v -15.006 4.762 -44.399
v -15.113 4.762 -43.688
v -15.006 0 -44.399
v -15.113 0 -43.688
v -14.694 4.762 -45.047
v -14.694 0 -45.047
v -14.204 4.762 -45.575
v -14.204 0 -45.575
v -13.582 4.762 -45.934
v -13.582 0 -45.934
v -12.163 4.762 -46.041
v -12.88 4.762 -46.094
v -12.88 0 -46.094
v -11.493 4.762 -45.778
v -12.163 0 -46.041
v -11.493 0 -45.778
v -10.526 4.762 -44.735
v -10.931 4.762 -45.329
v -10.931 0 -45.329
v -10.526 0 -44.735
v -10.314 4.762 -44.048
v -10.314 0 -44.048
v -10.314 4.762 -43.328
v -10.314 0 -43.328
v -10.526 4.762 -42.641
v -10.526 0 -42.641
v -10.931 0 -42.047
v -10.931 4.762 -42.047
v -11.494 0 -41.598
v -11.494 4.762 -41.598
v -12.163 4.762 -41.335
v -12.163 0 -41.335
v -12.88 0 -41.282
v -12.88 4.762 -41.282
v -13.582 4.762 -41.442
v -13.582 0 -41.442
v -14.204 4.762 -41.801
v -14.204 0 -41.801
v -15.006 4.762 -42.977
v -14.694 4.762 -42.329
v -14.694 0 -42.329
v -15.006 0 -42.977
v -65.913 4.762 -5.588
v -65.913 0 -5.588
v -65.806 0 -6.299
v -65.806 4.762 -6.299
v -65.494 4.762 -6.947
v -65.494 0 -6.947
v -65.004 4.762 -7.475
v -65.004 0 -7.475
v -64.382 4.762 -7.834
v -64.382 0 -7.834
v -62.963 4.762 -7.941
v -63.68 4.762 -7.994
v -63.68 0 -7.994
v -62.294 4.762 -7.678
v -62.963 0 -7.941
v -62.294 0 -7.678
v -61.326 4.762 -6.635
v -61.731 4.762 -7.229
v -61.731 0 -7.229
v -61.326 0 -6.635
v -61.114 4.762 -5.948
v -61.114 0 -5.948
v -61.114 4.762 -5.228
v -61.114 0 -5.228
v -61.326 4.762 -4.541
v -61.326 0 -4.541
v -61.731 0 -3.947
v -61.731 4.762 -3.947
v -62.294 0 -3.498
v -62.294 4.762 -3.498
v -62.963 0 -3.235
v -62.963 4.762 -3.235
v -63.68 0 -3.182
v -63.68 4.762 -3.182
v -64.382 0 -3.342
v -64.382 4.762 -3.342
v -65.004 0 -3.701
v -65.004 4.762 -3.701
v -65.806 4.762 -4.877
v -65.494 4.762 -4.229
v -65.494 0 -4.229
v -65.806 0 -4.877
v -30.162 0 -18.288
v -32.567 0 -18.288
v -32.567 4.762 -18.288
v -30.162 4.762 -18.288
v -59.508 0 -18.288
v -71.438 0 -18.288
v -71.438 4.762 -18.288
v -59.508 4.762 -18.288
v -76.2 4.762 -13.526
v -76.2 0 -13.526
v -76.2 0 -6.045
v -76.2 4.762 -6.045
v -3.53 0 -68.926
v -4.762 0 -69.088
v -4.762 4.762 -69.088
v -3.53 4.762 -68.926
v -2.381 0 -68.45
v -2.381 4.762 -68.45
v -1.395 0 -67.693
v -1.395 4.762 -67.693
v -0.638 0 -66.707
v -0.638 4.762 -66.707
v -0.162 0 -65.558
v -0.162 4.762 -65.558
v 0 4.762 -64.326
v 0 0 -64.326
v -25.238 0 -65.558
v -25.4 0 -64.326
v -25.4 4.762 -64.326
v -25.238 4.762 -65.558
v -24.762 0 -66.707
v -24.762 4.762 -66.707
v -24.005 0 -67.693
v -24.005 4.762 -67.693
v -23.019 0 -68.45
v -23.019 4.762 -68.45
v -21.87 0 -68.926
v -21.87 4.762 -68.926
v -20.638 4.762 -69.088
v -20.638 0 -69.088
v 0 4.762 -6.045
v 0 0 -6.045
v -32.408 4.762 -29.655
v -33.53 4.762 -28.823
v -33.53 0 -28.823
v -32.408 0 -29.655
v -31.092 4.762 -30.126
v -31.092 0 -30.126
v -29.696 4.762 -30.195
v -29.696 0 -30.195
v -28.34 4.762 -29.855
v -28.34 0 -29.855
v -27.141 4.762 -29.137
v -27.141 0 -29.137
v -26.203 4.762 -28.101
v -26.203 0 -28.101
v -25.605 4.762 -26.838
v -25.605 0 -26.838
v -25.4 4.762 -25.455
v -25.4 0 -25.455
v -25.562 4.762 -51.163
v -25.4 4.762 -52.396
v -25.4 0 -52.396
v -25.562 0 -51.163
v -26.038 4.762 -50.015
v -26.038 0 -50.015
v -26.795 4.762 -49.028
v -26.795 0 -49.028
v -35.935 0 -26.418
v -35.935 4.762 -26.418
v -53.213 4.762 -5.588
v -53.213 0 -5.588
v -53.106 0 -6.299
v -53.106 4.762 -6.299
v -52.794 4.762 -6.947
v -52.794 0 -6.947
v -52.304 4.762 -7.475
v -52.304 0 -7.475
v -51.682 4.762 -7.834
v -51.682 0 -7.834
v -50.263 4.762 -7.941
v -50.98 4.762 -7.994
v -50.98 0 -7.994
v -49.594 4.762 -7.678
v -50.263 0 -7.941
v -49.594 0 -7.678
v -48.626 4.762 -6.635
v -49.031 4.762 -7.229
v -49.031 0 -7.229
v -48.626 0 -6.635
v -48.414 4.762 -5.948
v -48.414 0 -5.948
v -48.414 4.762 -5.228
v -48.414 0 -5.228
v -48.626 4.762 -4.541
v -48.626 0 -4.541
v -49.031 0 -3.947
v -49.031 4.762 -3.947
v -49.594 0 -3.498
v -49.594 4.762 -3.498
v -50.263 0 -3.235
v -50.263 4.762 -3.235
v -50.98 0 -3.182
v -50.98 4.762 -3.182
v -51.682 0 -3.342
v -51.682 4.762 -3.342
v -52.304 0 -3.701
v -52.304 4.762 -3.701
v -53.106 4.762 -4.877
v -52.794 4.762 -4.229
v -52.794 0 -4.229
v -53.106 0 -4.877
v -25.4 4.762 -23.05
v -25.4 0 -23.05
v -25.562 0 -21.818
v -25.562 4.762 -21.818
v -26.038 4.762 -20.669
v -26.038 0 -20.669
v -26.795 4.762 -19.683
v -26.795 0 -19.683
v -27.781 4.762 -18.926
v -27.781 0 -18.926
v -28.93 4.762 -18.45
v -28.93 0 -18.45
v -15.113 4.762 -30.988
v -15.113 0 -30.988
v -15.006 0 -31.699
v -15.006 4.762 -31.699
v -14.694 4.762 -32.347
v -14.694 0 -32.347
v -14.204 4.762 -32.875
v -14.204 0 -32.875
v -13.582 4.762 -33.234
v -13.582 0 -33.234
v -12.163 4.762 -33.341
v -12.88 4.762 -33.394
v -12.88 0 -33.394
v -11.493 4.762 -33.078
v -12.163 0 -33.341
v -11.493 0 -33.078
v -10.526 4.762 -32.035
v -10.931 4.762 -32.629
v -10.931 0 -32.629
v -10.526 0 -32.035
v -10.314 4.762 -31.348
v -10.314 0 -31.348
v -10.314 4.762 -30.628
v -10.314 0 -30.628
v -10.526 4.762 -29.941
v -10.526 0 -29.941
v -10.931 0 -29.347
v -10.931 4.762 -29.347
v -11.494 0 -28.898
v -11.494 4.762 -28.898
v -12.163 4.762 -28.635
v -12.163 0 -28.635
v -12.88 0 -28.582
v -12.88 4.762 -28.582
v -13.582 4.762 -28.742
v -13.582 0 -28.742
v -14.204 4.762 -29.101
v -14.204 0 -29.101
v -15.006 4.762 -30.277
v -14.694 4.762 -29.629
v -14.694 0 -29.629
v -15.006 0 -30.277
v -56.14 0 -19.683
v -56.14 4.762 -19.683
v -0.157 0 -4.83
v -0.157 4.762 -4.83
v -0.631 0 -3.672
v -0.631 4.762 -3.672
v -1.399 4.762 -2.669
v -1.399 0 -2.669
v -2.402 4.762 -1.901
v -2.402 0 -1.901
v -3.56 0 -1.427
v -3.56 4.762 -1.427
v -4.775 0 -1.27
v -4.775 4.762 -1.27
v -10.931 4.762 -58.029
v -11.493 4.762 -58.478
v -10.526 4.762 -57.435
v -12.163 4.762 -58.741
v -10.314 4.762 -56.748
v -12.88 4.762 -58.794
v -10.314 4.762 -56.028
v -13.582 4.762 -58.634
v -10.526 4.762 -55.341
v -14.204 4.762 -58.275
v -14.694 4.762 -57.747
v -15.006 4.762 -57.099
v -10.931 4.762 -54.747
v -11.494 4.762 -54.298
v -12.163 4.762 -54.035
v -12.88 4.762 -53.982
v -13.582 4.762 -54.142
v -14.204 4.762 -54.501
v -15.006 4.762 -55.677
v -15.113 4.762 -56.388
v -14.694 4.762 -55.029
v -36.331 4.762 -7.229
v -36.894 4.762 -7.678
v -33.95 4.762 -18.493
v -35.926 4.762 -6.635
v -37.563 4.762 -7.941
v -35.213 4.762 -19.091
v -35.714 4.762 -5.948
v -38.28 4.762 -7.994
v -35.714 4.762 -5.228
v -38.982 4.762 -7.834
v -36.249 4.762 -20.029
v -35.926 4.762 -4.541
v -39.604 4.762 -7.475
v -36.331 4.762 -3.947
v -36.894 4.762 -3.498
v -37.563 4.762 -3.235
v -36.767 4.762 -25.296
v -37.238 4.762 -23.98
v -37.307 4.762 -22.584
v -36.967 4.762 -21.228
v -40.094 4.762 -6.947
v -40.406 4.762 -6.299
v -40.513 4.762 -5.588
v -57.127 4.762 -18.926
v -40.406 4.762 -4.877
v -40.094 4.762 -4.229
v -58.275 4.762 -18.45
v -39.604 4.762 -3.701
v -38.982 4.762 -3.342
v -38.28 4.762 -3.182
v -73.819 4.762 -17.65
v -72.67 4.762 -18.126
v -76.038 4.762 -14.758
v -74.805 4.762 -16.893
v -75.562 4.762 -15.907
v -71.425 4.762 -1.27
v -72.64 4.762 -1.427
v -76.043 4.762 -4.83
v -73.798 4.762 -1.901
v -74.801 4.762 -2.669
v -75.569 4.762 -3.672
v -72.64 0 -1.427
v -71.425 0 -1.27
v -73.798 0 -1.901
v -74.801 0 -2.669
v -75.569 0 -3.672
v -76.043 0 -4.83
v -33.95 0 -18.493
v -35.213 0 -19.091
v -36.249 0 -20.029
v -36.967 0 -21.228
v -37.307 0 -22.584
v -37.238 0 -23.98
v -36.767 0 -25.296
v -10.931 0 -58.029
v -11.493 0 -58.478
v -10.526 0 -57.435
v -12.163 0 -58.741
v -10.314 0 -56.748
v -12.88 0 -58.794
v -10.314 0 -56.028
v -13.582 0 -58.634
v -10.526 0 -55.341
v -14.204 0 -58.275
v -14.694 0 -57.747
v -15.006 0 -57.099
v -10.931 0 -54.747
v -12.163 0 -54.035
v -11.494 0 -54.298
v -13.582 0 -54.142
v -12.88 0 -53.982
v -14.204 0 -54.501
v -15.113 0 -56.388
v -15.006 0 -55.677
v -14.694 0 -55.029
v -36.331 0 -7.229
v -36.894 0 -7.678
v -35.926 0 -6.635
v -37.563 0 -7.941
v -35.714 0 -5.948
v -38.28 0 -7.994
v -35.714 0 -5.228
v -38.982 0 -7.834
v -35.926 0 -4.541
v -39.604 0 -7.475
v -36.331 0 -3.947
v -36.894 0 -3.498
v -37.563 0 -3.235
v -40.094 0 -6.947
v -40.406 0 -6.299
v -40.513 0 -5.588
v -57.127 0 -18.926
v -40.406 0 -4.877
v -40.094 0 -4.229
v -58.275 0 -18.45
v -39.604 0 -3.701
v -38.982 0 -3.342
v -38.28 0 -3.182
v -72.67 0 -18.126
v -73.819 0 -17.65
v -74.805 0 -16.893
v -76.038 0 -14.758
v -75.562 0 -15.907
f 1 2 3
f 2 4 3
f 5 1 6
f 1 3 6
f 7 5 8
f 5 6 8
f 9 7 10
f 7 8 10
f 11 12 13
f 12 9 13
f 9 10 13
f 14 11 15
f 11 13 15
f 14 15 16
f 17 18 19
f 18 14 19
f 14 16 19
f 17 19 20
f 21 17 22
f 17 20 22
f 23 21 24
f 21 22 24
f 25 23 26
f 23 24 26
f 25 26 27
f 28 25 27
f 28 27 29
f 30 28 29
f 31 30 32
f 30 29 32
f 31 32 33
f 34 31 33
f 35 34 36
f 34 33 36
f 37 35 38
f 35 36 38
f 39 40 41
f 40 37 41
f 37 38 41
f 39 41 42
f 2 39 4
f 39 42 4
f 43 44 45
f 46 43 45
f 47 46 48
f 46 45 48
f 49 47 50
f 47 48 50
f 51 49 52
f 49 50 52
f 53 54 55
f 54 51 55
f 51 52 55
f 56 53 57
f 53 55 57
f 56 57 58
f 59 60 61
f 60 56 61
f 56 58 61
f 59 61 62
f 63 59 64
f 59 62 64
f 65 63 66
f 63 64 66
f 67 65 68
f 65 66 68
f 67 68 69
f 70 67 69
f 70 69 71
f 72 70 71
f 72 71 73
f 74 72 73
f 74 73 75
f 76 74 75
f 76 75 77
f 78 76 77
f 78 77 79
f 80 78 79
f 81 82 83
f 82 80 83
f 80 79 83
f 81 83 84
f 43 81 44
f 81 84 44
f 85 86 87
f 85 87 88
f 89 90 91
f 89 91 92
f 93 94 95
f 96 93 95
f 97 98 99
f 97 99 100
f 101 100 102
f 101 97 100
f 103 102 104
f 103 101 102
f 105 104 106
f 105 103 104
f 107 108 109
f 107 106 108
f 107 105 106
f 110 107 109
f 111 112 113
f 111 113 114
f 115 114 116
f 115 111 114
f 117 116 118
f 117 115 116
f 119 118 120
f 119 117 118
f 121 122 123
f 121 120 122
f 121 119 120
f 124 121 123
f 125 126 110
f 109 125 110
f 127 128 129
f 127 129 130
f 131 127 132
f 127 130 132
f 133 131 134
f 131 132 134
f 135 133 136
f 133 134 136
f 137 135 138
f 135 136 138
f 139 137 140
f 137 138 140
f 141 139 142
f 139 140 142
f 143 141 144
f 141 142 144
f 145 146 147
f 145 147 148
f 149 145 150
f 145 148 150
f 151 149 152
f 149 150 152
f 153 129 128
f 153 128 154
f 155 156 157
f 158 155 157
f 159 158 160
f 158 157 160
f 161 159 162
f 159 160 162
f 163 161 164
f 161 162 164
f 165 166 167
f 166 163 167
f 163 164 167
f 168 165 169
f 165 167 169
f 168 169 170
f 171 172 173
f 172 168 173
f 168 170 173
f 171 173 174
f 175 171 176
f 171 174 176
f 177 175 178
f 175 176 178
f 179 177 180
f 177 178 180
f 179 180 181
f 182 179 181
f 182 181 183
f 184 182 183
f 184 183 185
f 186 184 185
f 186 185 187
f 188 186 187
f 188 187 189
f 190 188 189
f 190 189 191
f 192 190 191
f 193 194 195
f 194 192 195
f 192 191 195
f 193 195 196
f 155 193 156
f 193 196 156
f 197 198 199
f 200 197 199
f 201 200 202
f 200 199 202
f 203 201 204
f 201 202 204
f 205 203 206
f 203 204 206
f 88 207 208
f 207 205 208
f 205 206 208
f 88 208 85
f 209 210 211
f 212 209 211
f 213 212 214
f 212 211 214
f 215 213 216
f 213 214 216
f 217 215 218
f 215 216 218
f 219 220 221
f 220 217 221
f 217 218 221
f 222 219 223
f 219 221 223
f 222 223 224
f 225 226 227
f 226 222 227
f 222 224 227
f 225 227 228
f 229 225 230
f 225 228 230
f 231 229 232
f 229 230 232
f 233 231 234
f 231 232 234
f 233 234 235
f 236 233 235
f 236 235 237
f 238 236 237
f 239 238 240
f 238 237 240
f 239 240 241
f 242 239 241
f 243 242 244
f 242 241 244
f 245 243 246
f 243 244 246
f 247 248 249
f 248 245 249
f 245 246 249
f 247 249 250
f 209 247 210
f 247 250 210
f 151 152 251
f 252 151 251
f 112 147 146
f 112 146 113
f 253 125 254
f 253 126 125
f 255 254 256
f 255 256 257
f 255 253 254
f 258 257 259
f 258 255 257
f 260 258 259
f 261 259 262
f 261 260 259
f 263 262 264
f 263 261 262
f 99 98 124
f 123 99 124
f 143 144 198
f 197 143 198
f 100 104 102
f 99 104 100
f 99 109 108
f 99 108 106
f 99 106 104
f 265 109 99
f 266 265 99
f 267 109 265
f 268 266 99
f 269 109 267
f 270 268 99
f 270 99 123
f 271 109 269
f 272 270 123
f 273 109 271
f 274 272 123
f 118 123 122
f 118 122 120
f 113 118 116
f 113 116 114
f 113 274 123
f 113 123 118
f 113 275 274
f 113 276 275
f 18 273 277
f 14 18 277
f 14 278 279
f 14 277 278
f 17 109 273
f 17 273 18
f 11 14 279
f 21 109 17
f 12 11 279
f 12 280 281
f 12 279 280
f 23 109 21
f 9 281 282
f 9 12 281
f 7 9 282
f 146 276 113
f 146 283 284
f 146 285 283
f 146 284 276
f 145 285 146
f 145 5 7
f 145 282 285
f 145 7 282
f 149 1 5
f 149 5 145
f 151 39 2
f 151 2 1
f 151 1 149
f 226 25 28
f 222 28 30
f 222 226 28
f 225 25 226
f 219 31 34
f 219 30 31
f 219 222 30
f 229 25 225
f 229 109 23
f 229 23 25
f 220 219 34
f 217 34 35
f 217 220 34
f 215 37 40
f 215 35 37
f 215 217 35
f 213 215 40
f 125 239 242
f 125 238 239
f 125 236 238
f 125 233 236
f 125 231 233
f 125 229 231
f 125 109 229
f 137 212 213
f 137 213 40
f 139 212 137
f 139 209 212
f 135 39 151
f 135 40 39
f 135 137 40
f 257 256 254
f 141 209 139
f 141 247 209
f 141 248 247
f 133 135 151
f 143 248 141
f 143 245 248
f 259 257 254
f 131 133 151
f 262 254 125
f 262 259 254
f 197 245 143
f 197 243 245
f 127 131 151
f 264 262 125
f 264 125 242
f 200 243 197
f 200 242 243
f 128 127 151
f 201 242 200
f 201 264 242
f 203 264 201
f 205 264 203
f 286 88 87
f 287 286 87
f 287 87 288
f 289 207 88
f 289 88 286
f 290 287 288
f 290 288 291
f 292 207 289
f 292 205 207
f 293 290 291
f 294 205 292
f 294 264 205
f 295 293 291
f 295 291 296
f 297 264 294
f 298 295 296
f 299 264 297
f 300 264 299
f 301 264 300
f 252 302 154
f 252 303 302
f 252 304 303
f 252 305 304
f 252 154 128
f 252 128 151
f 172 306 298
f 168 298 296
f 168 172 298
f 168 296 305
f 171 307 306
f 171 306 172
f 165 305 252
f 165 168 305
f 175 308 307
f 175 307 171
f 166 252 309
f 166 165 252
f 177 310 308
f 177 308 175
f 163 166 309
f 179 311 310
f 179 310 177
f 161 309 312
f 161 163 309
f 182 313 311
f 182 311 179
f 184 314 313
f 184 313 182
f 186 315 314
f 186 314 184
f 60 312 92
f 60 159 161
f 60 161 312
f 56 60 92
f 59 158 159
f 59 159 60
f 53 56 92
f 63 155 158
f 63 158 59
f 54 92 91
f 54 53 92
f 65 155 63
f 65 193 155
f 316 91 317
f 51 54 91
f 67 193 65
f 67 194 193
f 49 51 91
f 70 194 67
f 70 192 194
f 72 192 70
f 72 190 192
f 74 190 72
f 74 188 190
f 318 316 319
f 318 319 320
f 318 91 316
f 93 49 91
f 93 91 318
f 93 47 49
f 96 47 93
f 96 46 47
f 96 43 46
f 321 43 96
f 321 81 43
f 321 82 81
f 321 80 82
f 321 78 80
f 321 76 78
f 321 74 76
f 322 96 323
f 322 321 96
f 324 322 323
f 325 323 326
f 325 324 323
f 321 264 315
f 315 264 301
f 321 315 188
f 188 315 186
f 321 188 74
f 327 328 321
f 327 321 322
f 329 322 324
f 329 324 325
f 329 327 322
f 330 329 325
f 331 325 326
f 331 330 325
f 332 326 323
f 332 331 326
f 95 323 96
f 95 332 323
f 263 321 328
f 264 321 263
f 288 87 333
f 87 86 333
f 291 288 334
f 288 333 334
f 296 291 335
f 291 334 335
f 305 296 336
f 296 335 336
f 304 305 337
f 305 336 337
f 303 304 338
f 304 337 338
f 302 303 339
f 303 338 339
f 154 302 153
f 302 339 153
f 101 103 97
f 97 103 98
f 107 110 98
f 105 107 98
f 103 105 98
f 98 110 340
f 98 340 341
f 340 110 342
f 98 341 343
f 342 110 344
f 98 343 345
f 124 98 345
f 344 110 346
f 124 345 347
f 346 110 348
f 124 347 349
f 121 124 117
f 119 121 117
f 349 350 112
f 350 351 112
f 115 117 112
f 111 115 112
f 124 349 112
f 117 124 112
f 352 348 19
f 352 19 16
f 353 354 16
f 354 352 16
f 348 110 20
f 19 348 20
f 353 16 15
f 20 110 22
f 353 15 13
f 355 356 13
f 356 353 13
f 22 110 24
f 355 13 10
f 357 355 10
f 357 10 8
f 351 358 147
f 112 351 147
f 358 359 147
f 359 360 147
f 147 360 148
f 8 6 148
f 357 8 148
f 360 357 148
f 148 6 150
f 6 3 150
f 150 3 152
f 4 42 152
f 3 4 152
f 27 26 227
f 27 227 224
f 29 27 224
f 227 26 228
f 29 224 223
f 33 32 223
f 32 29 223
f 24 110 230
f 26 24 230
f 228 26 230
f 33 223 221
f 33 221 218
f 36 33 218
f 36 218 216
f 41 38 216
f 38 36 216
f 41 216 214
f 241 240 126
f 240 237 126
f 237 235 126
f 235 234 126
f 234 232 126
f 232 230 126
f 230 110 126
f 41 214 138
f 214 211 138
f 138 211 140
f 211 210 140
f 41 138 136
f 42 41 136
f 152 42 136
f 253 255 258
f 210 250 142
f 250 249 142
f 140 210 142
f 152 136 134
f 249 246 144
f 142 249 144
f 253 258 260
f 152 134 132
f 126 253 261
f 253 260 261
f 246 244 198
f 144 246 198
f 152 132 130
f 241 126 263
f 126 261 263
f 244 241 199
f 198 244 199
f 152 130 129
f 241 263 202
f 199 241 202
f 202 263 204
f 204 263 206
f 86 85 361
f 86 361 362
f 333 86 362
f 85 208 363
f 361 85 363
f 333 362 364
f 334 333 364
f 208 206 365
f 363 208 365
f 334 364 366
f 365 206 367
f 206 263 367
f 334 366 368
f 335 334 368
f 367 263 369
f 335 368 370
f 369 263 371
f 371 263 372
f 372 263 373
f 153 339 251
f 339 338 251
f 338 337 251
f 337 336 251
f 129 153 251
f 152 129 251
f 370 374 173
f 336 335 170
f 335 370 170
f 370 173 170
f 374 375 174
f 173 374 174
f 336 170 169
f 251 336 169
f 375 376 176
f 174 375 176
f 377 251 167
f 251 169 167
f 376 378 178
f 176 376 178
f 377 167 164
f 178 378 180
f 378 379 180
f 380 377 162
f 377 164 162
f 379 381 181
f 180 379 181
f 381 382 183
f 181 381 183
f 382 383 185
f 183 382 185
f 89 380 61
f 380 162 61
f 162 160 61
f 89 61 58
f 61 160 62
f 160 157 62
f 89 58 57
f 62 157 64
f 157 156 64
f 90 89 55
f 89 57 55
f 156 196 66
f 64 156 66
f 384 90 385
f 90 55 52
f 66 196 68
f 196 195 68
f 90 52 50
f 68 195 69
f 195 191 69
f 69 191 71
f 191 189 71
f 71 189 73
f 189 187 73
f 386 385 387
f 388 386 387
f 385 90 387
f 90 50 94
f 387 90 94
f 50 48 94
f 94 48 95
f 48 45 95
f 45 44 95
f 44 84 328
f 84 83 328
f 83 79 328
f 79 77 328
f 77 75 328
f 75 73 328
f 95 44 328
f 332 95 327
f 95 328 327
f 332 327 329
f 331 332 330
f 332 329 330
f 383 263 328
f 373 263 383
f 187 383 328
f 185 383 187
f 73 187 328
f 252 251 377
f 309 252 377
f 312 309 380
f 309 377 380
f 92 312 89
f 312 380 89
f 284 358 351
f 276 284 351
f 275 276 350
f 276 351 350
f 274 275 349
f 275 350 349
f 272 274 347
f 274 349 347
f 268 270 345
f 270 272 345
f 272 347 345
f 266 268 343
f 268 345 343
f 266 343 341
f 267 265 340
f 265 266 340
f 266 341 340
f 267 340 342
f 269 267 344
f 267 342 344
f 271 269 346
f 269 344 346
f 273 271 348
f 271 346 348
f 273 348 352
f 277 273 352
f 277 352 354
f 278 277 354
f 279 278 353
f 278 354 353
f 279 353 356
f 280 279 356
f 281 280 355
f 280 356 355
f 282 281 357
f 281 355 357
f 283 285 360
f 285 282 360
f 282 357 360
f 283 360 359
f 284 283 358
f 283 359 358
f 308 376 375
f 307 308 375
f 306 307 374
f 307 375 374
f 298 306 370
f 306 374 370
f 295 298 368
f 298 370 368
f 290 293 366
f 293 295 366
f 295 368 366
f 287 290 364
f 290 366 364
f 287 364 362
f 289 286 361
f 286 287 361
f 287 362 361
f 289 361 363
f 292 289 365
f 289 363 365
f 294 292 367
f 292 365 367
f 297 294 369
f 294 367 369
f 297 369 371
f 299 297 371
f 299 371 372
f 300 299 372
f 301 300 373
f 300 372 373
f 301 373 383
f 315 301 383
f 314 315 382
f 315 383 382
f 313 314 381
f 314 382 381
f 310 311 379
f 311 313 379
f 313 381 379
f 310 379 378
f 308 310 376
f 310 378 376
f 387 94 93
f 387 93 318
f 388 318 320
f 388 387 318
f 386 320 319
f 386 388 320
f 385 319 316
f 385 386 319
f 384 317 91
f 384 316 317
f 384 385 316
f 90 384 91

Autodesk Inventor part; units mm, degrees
ref_plane "YZ Plane" through (0, 0, 0) normal (1, 0, 0) x (0, 1, 0)
ref_plane "XZ Plane" through (0, 0, 0) normal (0, 1, 0) x (-1, 0, 0)
ref_plane "XY Plane" through (0, 0, 0) normal (0, 0, 1) x (1, 0, 0)
sketch "Sketch1" plane through (0, 0, 0) normal (0, 1, 0) x (-1, 0, 0)
  line L0 (0, -4.7625) -> (0, -64.3255)
  line L1 (4.7625, -69.088) -> (20.6375, -69.088)
  line L2 (76.2, -13.5255) -> (76.2, -4.7625)
  line L3 (71.4375, 0) -> (4.7625, 0)
  circle A0 centre (12.7, -30.988) radius 2.413
  arc A1 (4.7625, 0) -> (0, -4.7625) centre (4.7625, -4.7625) ccw
  circle A2 centre (12.7, -43.688) radius 2.413
  circle A3 centre (12.7, -56.388) radius 2.413
  circle A4 centre (38.1, -5.588) radius 2.413
  circle A5 centre (50.8, -5.588) radius 2.413
  circle A6 centre (63.5, -5.588) radius 2.413
  line L4 (14.4062, -54.6818) -> (61.7938, -7.2942) construction
  line L5 (26.7949, -49.0283) -> (56.1403, -19.6829)
  line L6 (33.5301, -28.8227) -> (35.9347, -26.4181)
  line L7 (25.4, -69.088) -> (25.4, -18.288) construction
  line L8 (76.2, -18.288) -> (25.4, -18.288) construction
  line L9 (25.4, -52.3959) -> (25.4, -64.3255)
  line L10 (71.4375, -18.288) -> (59.5079, -18.288)
  arc A7 (71.4375, -18.288) -> (76.2, -13.5255) centre (71.4375, -13.5255) ccw
  arc A8 (76.2, -4.7625) -> (71.4375, 0) centre (71.4375, -4.7625) ccw
  arc A9 (20.6375, -69.088) -> (25.4, -64.3255) centre (20.6375, -64.3255) ccw
  arc A10 (0, -64.3255) -> (4.7625, -69.088) centre (4.7625, -64.3255) ccw
  line L11 (32.5671, -18.288) -> (30.1625, -18.288)
  line L12 (25.4, -25.4551) -> (25.4, -23.0505)
  arc A11 (59.5079, -18.288) -> (56.1403, -19.6829) centre (59.5079, -23.0505) ccw
  arc A12 (26.7949, -49.0283) -> (25.4, -52.3959) centre (30.1625, -52.3959) ccw
  arc A13 (35.9347, -26.4181) -> (32.5671, -18.288) centre (32.5671, -23.0505) ccw
  arc A14 (25.4, -25.4551) -> (33.5301, -28.8227) centre (30.1625, -25.4551) ccw
  arc A15 (30.1625, -18.288) -> (25.4, -23.0505) centre (30.1625, -23.0505) ccw
  point P0 (0, 0)
  point P1 (0, 7.112)
  point P2 (0, -69.088)
  point P3 (25.4, -50.4232)
  point P4 (57.5352, -18.288)
  point P5 (25.4, -36.9528)
  point P6 (44.0648, -18.288)
  dimension "d0" = 76.2
  dimension "d1" = 4.826
  dimension "d2" = 4.7625
  dimension "d3" = 12.7
  dimension "d4" = 12.7
  dimension "d5" = 12.7
  dimension "d7" = 12.7
  dimension "d8" = 12.7
  dimension "d9" = 38.1
  dimension "d10" = 25.4
  dimension "d11" = 4.7625
  dimension "d12" = 4.7625
  dimension "d13" = 4.7625
  dimension "d14" = 4.7625
  dimension "d15" = 4.7625
  dimension "d16" = 18.288
  dimension "d17" = 25.4
  dimension "d18" = 76.2
  dimension "d19" = 12.7
  dimension "d20" = 38.1
extrude "Extrusion1" add sketch "Sketch1" along normal blind 4.7625
thread "Thread2" size "10-32 UNF" class "2B" standard "ANSI Unified Screw Threads" full length
thread "Thread3" size "10-32 UNF" class "2B" standard "ANSI Unified Screw Threads" full length
thread "Thread4" size "10-32 UNF" class "2B" standard "ANSI Unified Screw Threads" full length
thread "Thread5" size "10-32 UNF" class "2B" standard "ANSI Unified Screw Threads" full length
thread "Thread6" size "10-32 UNF" class "2B" standard "ANSI Unified Screw Threads" full length
thread "Thread7" size "10-32 UNF" class "2B" standard "ANSI Unified Screw Threads" full length
sketch "Sketch2" plane through (0, 4.7625, 0) normal (0, 1, 0) x (1, 0, 0)
  line L0 (-71.4375, 0) -> (-4.7625, 0) projected
  line L1 (-76.2, 1.27) -> (0, 1.27)
  line L2 (-76.2, 13.5255) -> (-76.2, 4.7625) projected
  line L3 (0, 4.7625) -> (0, 64.3255) projected
  line L4 (0, 1.27) -> (0, 0)
  line L5 (0, 0) -> (-76.2, 0)
  line L6 (-76.2, 0) -> (-76.2, 1.27)
  dimension "d37" = 1.27
extrude "Extrusion2" cut sketch "Sketch2" against normal through all
fillet "Fillet1" radius 4.7752 2 edges at (-74.6754, 2.3813, -1.27) (-1.5246, 2.3813, -1.27)
properties part number "ELEV_012_SUPBRK2_THRD" material "Aluminum 6061"
